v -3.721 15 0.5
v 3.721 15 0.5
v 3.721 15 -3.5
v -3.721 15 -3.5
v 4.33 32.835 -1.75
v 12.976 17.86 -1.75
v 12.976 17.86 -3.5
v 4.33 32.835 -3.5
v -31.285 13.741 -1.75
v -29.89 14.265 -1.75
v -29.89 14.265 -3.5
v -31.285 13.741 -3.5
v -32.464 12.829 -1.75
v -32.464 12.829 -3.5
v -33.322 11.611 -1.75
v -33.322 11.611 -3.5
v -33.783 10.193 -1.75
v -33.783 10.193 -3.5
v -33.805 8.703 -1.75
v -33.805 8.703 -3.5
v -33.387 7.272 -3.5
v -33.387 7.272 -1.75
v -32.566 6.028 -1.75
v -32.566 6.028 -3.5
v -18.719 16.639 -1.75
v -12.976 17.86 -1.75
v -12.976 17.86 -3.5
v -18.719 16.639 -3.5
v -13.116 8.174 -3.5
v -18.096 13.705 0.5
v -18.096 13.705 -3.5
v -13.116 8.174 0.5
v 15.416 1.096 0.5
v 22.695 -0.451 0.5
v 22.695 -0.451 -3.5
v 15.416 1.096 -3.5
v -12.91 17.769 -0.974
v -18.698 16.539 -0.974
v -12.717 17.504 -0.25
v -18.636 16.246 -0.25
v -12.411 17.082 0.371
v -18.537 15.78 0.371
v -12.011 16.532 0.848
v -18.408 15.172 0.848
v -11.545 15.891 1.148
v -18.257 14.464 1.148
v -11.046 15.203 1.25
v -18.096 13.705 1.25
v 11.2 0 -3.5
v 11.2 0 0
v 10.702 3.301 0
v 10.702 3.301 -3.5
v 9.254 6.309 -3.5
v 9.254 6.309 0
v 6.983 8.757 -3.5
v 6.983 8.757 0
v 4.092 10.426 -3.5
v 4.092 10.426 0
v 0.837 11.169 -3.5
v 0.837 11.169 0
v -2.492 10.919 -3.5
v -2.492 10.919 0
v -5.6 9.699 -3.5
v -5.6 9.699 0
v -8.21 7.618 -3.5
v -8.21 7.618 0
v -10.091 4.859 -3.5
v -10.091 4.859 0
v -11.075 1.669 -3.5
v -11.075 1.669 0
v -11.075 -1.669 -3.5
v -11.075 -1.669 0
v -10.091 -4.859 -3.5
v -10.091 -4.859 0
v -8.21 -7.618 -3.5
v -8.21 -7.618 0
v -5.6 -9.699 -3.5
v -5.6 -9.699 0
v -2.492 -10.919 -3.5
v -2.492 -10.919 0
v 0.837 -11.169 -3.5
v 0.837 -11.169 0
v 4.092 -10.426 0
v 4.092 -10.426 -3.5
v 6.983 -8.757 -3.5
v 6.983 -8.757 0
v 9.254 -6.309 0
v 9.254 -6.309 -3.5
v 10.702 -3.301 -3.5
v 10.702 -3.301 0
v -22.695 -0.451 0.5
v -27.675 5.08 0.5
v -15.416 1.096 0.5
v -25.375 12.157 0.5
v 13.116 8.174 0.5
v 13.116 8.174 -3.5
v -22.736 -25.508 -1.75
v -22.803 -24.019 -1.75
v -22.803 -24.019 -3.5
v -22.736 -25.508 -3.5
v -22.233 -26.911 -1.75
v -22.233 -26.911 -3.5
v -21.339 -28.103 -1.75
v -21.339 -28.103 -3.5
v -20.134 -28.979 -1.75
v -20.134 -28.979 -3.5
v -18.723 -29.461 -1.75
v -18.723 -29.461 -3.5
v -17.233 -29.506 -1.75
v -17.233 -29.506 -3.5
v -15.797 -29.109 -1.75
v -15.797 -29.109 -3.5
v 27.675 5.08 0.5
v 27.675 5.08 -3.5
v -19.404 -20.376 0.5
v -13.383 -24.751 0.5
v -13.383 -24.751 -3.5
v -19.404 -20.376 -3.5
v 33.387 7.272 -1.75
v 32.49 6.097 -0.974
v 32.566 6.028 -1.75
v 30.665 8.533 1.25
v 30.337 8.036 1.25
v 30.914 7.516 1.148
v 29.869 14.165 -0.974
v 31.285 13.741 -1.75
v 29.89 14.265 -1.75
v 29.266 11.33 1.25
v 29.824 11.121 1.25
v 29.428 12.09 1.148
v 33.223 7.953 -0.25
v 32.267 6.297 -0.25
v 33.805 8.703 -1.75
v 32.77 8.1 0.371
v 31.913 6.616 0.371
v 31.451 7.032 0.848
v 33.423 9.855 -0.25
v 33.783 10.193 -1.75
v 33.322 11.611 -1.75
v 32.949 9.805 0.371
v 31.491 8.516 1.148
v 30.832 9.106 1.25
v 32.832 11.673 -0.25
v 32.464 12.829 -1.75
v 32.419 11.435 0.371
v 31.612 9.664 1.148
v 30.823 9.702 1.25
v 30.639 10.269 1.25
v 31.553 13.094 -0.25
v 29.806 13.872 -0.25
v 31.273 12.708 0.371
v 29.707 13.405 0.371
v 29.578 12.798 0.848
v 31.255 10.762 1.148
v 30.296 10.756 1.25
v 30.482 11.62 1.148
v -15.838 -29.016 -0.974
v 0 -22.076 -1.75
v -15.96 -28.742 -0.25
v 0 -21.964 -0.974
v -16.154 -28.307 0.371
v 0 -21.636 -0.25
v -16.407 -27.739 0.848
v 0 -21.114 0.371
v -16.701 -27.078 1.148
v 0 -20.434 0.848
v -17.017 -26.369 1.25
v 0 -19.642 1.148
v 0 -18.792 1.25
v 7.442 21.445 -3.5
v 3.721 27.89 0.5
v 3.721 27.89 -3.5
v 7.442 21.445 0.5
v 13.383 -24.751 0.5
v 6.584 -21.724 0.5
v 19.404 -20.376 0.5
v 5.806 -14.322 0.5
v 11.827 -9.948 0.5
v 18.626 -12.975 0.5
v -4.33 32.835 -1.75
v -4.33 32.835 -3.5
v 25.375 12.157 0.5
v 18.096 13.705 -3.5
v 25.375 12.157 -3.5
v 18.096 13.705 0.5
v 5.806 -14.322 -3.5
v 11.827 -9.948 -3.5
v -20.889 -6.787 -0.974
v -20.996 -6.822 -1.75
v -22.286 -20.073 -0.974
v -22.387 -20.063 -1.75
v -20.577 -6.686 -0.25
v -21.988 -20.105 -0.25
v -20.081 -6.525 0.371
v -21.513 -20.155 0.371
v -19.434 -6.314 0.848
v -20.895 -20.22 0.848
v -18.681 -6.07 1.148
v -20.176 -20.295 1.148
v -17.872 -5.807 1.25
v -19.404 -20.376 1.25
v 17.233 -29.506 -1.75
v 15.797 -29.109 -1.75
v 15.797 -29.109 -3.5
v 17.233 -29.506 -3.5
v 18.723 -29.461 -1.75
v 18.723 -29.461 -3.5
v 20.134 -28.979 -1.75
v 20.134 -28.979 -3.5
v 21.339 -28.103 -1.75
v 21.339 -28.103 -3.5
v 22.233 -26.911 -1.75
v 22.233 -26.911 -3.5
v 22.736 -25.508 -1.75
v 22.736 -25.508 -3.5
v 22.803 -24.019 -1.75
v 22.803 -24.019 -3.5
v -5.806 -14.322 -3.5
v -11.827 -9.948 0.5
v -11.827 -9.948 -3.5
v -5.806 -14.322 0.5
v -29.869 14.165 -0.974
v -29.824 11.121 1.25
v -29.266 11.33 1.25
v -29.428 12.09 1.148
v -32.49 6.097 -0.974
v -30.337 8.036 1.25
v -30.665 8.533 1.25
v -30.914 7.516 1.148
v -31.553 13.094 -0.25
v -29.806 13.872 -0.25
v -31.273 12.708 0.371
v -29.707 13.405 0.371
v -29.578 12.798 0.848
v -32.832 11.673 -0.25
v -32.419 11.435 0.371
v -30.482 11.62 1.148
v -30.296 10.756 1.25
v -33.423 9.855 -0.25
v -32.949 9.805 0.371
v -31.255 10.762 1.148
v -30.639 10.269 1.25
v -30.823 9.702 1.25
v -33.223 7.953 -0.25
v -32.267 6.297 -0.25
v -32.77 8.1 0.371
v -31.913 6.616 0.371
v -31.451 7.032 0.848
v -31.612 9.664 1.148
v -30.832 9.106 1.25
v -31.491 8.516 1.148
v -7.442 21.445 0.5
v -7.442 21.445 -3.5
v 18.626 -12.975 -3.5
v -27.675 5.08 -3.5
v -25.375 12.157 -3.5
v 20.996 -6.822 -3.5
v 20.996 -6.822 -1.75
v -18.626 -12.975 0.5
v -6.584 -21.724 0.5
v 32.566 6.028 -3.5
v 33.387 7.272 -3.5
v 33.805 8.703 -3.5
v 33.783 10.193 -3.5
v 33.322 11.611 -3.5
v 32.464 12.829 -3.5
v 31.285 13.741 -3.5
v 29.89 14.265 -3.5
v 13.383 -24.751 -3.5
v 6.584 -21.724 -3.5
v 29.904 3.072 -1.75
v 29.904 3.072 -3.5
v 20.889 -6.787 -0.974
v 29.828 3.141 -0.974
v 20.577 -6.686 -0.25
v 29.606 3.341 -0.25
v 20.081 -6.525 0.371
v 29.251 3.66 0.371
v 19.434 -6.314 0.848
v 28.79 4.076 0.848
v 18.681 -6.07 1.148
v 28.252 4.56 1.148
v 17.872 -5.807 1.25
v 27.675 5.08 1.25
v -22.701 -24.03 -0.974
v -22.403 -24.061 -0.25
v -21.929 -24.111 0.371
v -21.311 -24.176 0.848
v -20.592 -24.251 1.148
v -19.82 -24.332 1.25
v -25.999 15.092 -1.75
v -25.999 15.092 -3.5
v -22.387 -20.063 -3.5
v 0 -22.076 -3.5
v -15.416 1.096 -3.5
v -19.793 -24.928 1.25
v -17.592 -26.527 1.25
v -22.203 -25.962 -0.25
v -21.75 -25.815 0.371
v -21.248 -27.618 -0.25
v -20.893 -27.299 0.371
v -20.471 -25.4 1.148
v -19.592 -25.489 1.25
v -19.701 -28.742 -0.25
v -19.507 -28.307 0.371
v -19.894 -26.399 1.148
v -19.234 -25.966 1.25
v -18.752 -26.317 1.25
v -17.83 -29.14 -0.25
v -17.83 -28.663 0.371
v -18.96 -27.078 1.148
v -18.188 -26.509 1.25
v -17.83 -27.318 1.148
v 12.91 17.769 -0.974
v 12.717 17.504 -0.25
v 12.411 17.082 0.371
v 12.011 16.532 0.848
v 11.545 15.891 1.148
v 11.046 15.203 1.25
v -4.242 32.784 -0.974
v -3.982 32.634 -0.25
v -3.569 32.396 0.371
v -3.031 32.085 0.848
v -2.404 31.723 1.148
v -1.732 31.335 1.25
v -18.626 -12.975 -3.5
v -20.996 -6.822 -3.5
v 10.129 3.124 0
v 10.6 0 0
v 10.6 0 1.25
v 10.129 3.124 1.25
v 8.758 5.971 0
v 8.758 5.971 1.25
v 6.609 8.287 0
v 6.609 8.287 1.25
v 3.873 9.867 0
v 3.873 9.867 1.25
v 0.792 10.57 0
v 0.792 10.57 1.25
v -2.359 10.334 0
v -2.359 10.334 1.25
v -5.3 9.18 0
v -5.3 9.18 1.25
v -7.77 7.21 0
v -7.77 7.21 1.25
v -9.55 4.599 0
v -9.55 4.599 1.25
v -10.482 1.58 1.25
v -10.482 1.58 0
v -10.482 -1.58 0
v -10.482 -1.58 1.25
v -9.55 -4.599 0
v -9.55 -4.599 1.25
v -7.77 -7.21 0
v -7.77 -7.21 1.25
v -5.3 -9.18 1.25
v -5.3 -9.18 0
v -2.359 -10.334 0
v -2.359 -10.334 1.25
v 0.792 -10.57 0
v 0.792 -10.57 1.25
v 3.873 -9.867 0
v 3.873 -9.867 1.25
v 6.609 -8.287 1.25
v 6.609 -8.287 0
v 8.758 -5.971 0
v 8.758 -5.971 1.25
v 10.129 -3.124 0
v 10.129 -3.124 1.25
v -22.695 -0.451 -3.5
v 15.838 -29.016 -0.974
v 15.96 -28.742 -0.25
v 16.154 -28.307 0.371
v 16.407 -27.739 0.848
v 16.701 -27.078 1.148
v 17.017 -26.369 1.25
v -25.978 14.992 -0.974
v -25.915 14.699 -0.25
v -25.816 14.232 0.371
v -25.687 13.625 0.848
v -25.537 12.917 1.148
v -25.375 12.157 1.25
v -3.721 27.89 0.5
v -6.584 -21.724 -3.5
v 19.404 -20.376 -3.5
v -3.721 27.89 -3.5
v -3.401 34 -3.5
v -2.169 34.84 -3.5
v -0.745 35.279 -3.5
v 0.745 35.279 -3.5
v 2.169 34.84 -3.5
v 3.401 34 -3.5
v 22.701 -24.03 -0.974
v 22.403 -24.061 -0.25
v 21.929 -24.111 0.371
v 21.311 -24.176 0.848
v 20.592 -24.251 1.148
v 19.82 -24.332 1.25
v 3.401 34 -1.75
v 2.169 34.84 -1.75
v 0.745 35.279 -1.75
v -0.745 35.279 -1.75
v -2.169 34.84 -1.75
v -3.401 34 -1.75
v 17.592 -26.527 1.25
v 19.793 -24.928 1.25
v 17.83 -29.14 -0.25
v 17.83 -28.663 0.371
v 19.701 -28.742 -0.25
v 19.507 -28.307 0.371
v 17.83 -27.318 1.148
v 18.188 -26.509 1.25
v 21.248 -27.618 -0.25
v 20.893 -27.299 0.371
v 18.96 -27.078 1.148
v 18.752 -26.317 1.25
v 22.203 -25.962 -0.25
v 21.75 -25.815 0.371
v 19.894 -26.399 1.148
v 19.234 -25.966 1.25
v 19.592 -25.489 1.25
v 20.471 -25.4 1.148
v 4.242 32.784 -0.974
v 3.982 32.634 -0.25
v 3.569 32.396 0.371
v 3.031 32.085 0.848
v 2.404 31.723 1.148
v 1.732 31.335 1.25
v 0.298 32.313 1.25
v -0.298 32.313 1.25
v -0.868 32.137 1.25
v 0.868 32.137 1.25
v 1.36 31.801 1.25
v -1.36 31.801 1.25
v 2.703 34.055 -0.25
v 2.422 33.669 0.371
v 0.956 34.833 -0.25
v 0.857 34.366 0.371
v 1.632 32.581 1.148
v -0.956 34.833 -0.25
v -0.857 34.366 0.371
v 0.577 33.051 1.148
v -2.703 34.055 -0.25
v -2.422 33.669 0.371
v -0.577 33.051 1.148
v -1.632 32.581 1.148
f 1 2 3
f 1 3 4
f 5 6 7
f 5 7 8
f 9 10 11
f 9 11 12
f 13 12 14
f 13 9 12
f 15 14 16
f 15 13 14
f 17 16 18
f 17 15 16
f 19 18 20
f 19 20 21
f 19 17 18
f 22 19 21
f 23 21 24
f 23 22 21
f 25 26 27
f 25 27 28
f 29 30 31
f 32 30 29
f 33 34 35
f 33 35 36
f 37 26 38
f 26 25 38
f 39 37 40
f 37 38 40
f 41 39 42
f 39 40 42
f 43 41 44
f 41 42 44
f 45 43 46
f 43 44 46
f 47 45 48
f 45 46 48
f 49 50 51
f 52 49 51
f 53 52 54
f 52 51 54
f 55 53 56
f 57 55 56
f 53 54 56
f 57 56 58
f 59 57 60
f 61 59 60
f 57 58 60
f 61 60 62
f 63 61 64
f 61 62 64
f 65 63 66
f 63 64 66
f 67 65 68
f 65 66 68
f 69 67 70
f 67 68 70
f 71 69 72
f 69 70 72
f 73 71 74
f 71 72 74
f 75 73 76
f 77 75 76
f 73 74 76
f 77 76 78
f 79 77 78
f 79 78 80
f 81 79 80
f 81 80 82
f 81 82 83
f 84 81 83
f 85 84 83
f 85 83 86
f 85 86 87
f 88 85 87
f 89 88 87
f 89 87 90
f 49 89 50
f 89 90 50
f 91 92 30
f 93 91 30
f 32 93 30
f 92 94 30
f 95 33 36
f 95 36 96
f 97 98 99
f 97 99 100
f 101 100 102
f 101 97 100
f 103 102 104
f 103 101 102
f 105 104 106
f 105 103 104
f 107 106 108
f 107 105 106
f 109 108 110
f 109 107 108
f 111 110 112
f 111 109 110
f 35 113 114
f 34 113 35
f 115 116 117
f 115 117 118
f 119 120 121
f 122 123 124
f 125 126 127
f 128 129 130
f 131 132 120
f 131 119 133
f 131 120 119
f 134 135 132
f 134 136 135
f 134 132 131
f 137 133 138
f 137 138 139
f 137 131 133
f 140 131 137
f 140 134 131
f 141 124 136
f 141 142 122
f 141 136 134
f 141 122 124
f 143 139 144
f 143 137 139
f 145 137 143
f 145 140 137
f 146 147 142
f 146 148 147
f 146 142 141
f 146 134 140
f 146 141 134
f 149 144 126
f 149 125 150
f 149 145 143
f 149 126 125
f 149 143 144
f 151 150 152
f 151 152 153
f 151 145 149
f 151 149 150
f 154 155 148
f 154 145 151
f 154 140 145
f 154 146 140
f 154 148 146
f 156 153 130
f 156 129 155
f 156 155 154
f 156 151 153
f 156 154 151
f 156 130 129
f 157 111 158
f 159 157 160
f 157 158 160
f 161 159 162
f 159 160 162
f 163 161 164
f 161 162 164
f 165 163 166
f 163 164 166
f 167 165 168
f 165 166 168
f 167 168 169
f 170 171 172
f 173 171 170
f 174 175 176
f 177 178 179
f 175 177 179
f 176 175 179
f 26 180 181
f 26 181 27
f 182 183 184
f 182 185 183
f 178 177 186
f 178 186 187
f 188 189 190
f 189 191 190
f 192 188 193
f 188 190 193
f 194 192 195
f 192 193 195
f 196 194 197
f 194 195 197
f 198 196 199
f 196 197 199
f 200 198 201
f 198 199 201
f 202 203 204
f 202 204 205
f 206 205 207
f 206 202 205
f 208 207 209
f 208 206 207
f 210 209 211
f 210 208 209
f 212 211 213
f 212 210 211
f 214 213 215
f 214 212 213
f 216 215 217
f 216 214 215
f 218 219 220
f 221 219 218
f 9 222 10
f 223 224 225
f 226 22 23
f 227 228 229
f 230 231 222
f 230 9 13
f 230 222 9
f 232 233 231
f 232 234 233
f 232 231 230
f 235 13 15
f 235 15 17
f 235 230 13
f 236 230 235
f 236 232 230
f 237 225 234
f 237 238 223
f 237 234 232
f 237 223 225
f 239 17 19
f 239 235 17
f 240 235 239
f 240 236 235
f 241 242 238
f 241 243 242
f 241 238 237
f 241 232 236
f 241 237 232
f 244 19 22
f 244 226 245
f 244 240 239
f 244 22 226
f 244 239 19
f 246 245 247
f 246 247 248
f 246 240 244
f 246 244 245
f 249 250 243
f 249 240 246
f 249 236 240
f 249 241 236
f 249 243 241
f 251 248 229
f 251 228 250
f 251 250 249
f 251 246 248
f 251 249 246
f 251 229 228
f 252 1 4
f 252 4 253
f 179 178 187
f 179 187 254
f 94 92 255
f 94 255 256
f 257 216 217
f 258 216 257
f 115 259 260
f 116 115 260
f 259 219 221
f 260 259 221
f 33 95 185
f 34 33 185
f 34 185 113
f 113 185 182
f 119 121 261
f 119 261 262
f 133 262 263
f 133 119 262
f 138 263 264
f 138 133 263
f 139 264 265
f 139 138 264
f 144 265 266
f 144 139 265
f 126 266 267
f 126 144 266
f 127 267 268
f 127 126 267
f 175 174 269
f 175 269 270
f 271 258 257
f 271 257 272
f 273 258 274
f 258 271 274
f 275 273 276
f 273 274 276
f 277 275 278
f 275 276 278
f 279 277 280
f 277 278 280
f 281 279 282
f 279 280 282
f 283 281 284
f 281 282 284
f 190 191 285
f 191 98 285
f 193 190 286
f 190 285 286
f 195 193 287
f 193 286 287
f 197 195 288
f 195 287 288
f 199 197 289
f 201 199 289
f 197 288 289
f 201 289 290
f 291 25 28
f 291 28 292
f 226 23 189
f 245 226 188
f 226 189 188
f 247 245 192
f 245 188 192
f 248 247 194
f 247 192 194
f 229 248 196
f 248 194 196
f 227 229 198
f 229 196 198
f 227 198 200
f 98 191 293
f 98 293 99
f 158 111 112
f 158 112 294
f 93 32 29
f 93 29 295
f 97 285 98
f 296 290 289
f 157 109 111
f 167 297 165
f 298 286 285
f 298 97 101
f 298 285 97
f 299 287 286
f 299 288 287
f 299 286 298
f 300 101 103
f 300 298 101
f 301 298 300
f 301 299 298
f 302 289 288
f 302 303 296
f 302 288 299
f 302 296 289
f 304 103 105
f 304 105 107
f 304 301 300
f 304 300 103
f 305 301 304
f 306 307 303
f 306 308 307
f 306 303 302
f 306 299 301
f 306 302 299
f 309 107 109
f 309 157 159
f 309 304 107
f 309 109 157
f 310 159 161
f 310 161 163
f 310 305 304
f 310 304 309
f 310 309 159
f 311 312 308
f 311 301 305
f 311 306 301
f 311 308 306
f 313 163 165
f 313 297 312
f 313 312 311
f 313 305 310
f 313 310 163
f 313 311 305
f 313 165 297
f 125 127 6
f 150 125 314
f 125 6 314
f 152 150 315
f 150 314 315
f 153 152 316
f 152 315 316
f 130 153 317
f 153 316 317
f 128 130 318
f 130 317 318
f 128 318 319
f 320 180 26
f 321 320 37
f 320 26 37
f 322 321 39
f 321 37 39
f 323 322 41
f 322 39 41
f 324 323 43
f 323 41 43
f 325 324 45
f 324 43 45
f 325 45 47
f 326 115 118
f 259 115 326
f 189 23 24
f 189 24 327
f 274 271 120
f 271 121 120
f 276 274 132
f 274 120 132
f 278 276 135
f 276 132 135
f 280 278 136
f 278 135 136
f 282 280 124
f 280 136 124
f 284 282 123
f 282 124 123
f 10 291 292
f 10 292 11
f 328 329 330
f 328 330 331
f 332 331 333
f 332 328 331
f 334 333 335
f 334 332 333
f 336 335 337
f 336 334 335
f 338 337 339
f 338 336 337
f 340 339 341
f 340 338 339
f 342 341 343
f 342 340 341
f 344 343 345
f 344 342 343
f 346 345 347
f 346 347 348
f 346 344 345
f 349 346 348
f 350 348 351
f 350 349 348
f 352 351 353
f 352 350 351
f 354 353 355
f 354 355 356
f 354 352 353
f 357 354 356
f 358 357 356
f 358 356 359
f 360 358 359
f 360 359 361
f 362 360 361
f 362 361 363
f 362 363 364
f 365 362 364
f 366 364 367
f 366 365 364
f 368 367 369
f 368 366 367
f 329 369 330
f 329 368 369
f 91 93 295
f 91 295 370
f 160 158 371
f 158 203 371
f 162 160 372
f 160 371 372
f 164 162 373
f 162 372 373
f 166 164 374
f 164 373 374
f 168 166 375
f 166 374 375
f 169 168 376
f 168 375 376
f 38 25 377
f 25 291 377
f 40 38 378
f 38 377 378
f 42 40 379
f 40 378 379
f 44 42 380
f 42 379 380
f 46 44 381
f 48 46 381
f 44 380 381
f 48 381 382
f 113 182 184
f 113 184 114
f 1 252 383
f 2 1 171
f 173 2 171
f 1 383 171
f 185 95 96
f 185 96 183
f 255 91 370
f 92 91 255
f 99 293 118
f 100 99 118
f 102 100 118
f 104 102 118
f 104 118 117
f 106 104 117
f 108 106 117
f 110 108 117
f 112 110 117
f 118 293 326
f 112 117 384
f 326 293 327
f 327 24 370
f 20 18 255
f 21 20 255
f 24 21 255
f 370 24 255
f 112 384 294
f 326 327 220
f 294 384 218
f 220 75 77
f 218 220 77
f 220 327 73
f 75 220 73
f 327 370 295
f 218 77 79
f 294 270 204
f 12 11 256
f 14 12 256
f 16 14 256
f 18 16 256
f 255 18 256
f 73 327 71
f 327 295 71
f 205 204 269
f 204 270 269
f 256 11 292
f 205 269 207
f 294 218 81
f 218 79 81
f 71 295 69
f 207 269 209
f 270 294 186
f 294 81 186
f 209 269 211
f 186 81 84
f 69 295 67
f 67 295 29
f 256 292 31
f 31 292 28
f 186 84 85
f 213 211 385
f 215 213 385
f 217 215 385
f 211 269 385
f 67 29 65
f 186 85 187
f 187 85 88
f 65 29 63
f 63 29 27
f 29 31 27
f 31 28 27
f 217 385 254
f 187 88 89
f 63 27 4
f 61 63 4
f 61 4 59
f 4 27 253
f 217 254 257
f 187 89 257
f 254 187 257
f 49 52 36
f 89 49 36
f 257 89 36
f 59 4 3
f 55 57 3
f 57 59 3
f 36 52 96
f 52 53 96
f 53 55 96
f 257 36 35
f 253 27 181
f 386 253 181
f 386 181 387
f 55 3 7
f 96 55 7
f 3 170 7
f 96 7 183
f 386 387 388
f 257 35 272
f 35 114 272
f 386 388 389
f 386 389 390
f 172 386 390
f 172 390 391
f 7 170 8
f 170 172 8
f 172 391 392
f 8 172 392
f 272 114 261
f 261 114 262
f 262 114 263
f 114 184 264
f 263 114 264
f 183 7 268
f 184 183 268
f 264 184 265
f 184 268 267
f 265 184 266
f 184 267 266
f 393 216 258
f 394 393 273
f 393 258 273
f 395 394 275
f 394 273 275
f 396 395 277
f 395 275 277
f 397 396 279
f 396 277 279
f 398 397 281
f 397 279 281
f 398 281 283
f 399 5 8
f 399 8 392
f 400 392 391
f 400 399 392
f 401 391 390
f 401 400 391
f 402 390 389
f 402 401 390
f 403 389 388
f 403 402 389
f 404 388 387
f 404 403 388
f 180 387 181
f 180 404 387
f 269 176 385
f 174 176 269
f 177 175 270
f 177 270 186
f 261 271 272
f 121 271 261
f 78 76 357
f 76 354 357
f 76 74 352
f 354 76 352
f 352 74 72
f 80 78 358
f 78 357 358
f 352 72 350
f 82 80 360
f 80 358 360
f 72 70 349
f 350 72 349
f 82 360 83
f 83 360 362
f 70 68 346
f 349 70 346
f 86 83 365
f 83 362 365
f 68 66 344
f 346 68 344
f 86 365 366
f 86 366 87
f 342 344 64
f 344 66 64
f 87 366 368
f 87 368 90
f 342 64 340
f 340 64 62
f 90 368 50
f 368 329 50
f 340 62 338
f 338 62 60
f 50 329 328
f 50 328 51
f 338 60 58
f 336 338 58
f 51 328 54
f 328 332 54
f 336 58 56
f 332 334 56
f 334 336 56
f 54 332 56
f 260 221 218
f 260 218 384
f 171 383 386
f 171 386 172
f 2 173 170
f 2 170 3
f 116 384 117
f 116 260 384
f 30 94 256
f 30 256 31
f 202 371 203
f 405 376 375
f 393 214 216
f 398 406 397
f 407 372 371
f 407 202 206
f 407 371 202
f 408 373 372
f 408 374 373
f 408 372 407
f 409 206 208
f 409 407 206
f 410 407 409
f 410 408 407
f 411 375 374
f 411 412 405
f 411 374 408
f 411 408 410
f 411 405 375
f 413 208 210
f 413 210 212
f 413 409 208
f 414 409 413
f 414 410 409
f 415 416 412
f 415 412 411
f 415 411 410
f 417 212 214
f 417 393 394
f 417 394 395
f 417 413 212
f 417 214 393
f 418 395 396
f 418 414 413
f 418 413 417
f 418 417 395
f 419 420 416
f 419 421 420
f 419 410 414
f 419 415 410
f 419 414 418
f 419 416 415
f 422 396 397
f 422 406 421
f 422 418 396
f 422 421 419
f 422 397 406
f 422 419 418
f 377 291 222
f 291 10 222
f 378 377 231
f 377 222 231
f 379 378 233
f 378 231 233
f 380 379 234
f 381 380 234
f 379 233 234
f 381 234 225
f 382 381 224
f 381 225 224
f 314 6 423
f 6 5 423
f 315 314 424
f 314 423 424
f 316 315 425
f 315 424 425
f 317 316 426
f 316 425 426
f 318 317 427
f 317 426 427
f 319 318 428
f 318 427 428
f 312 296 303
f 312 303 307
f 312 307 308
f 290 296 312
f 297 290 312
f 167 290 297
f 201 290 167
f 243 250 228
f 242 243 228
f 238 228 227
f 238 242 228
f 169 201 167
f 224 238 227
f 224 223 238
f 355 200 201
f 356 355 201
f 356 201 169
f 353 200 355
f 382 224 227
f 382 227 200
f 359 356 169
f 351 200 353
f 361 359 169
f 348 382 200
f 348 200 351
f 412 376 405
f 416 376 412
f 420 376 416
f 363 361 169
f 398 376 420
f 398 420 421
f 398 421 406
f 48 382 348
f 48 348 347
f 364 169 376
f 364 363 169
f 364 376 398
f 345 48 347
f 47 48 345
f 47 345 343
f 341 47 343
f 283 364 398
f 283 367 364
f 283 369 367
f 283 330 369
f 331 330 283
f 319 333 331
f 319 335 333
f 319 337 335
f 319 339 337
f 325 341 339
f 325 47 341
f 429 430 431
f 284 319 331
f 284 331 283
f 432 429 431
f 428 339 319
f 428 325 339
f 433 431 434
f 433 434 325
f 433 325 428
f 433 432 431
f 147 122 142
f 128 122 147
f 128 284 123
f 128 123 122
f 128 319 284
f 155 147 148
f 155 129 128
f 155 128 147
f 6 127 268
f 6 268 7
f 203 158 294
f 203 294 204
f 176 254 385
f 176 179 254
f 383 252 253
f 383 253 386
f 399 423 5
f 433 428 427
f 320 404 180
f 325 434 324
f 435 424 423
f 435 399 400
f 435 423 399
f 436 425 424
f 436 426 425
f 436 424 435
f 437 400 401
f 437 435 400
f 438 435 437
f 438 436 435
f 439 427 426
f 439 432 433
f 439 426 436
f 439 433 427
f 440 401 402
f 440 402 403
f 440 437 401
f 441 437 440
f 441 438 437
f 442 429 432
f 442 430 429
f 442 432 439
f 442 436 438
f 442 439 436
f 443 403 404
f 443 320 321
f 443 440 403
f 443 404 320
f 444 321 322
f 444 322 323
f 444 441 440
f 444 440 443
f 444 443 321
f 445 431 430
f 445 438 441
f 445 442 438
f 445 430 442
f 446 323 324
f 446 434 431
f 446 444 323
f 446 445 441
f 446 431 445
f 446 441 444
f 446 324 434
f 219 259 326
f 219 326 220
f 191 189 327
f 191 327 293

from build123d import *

# Parameters (mm, degrees)
F0_R     = 11.2
F0_R_2   = 10.6
F1_DEPTH = 1.25
F2_DEPTH = 3.5
F3_R     = 3
F4_DEPTH = 0.5


with BuildPart() as f1:
    # F0 (on Top) → F1 (new body)
    with BuildSketch(Plane.XY):
        with BuildLine():
            ThreePointArc((32.5660235492, 6.0283774926), (33.6055820033, 10.9191154962), (29.8898578759, 14.264768528))
            Line((29.8898578759, 14.264768528), (12.9759925753, 17.8599215809))
            Line((12.9759925753, 17.8599215809), (4.3301270189, 32.835))
            ThreePointArc((4.3301270189, 32.835), (0, 35.335), (-4.3301270189, 32.835))
            Line((-4.3301270189, 32.835), (-12.9759925753, 17.8599215809))
            Line((-12.9759925753, 17.8599215809), (-18.7194236958, 16.6391176097))
            Line((-18.7194236958, 16.6391176097), (-25.9988421276, 15.0918294569))
            Line((-25.9988421276, 15.0918294569), (-29.8898578759, 14.264768528))
            ThreePointArc((-29.8898578759, 14.264768528), (-33.6055820033, 10.9191154962), (-32.5660235492, 6.0283774926))
            Line((-32.5660235492, 6.0283774926), (-20.9955970247, -6.8218830075))
            Line((-20.9955970247, -6.8218830075), (-22.3872667993, -20.0627364432))
            Line((-22.3872667993, -20.0627364432), (-22.8030751051, -24.018888208))
            ThreePointArc((-22.8030751051, -24.018888208), (-20.7693918898, -28.5866154962), (-15.7967824129, -29.1092578126))
            Line((-15.7967824129, -29.1092578126), (0, -22.0760771468))
            Line((0, -22.0760771468), (15.7967824129, -29.1092578126))
            ThreePointArc((15.7967824129, -29.1092578126), (20.7693918898, -28.5866154962), (22.8030751051, -24.018888208))
            Line((22.8030751051, -24.018888208), (20.9955970247, -6.8218830075))
            Line((20.9955970247, -6.8218830075), (29.9042599002, 3.0721894725))
            Line((29.9042599002, 3.0721894725), (32.5660235492, 6.0283774926))
        make_face()
        with BuildLine():
            Line((3.7210224849, 27.89), (7.4420449699, 21.445))
            Line((7.4420449699, 21.445), (10.6005307066, 15.9743422289))
            ThreePointArc((10.6005307066, 15.9743422289), (11.1570110096, 15.3563082401), (11.9167581326, 15.0180470274))
            Line((11.9167581326, 15.0180470274), (18.0956886234, 13.7046748075))
            Line((18.0956886234, 13.7046748075), (25.3751070552, 12.1573866547))
            Line((25.3751070552, 12.1573866547), (29.2661228034, 11.3303257258))
            ThreePointArc((29.2661228034, 11.3303257258), (30.7524124544, 9.9920645131), (30.3365890728, 8.0357693116))
            Line((30.3365890728, 8.0357693116), (27.6748254238, 5.0795812915))
            Line((27.6748254238, 5.0795812915), (22.6951253605, -0.4509359188))
            Line((22.6951253605, -0.4509359188), (18.4682464081, -5.145360582))
            ThreePointArc((18.4682464081, -5.145360582), (18.0524230264, -5.865587806), (17.9654922683, -6.6926787213))
            Line((17.9654922683, -6.6926787213), (18.6257955889, -12.9750451642))
            Line((18.6257955889, -12.9750451642), (19.4037011132, -20.376321833))
            Line((19.4037011132, -20.376321833), (19.819509419, -24.3324735978))
            ThreePointArc((19.819509419, -24.3324735978), (19.0060361329, -26.1595645131), (17.0169923421, -26.3686214396))
            Line((17.0169923421, -26.3686214396), (13.3829602597, -24.7506461132))
            Line((13.3829602597, -24.7506461132), (6.5843138819, -21.7236937245))
            Line((6.5843138819, -21.7236937245), (0.8134732862, -19.154349953))
            ThreePointArc((0.8134732862, -19.154349953), (0, -18.9814408683), (-0.8134732862, -19.154349953))
            Line((-0.8134732862, -19.154349953), (-6.5843138819, -21.7236937245))
            Line((-6.5843138819, -21.7236937245), (-13.3829602597, -24.7506461132))
            Line((-13.3829602597, -24.7506461132), (-17.0169923421, -26.3686214396))
            ThreePointArc((-17.0169923421, -26.3686214396), (-19.0060361329, -26.1595645131), (-19.819509419, -24.3324735978))
            Line((-19.819509419, -24.3324735978), (-19.4037011132, -20.376321833))
            Line((-19.4037011132, -20.376321833), (-18.6257955889, -12.9750451642))
            Line((-18.6257955889, -12.9750451642), (-17.9654922683, -6.6926787213))
            ThreePointArc((-17.9654922683, -6.6926787213), (-18.0524230264, -5.865587806), (-18.4682464081, -5.145360582))
            Line((-18.4682464081, -5.145360582), (-22.6951253605, -0.4509359188))
            Line((-22.6951253605, -0.4509359188), (-27.6748254238, 5.0795812915))
            Line((-27.6748254238, 5.0795812915), (-30.3365890728, 8.0357693116))
            ThreePointArc((-30.3365890728, 8.0357693116), (-30.7524124544, 9.9920645131), (-29.2661228034, 11.3303257258))
            Line((-29.2661228034, 11.3303257258), (-25.3751070552, 12.1573866547))
            Line((-25.3751070552, 12.1573866547), (-18.0956886234, 13.7046748075))
            Line((-18.0956886234, 13.7046748075), (-11.9167581326, 15.0180470274))
            ThreePointArc((-11.9167581326, 15.0180470274), (-11.1570110096, 15.3563082401), (-10.6005307066, 15.9743422289))
            Line((-10.6005307066, 15.9743422289), (-7.4420449699, 21.445))
            Line((-7.4420449699, 21.445), (-3.7210224849, 27.89))
            Line((-3.7210224849, 27.89), (-1.7320508076, 31.335))
            ThreePointArc((-1.7320508076, 31.335), (0, 32.335), (1.7320508076, 31.335))
            Line((1.7320508076, 31.335), (3.7210224849, 27.89))
        make_face(mode=Mode.SUBTRACT)
        with BuildLine():
            Line((7.4420449699, 21.445), (3.7210224849, 15))
            Line((3.7210224849, 15), (-3.7210224849, 15))
            Line((-3.7210224849, 15), (-7.4420449699, 21.445))
            Line((-7.4420449699, 21.445), (-10.6005307066, 15.9743422289))
            ThreePointArc((-10.6005307066, 15.9743422289), (-11.1570110096, 15.3563082401), (-11.9167581326, 15.0180470274))
            Line((-11.9167581326, 15.0180470274), (-18.0956886234, 13.7046748075))
            Line((-18.0956886234, 13.7046748075), (-13.1159885601, 8.1741575972))
            Line((-13.1159885601, 8.1741575972), (-15.4157069287, 1.0963522341))
            Line((-15.4157069287, 1.0963522341), (-22.6951253605, -0.4509359188))
            Line((-22.6951253605, -0.4509359188), (-18.4682464081, -5.145360582))
            ThreePointArc((-18.4682464081, -5.145360582), (-18.0524230264, -5.865587806), (-17.9654922683, -6.6926787213))
            Line((-17.9654922683, -6.6926787213), (-18.6257955889, -12.9750451642))
            Line((-18.6257955889, -12.9750451642), (-11.8271492111, -9.9480927755))
            Line((-11.8271492111, -9.9480927755), (-5.8064083576, -14.3224170557))
            Line((-5.8064083576, -14.3224170557), (-6.5843138819, -21.7236937245))
            Line((-6.5843138819, -21.7236937245), (-0.8134732862, -19.154349953))
            ThreePointArc((-0.8134732862, -19.154349953), (0, -18.9814408683), (0.8134732862, -19.154349953))
            Line((0.8134732862, -19.154349953), (6.5843138819, -21.7236937245))
            Line((6.5843138819, -21.7236937245), (5.8064083576, -14.3224170557))
            Line((5.8064083576, -14.3224170557), (11.8271492111, -9.9480927755))
            Line((11.8271492111, -9.9480927755), (18.6257955889, -12.9750451642))
            Line((18.6257955889, -12.9750451642), (17.9654922683, -6.6926787213))
            ThreePointArc((17.9654922683, -6.6926787213), (18.0524230264, -5.865587806), (18.4682464081, -5.145360582))
            Line((18.4682464081, -5.145360582), (22.6951253605, -0.4509359188))
            Line((22.6951253605, -0.4509359188), (15.4157069287, 1.0963522341))
            Line((15.4157069287, 1.0963522341), (13.1159885601, 8.1741575972))
            Line((13.1159885601, 8.1741575972), (18.0956886234, 13.7046748075))
            Line((18.0956886234, 13.7046748075), (11.9167581326, 15.0180470274))
            ThreePointArc((11.9167581326, 15.0180470274), (11.1570110096, 15.3563082401), (10.6005307066, 15.9743422289))
            Line((10.6005307066, 15.9743422289), (7.4420449699, 21.445))
        make_face()
        Circle(F0_R, mode=Mode.SUBTRACT)
        Circle(F0_R)
        Circle(F0_R_2, mode=Mode.SUBTRACT)
        Polygon((-13.1159885601, 8.1741575972), (-18.0956886234, 13.7046748075), (-25.3751070552, 12.1573866547), (-27.6748254238, 5.0795812915), (-22.6951253605, -0.4509359188), (-15.4157069287, 1.0963522341), align=None)
        Polygon((-11.8271492111, -9.9480927755), (-18.6257955889, -12.9750451642), (-19.4037011132, -20.376321833), (-13.3829602597, -24.7506461132), (-6.5843138819, -21.7236937245), (-5.8064083576, -14.3224170557), align=None)
        Polygon((19.4037011132, -20.376321833), (18.6257955889, -12.9750451642), (11.8271492111, -9.9480927755), (5.8064083576, -14.3224170557), (6.5843138819, -21.7236937245), (13.3829602597, -24.7506461132), align=None)
        Polygon((25.3751070552, 12.1573866547), (18.0956886234, 13.7046748075), (13.1159885601, 8.1741575972), (15.4157069287, 1.0963522341), (22.6951253605, -0.4509359188), (27.6748254238, 5.0795812915), align=None)
        Polygon((-3.7210224849, 15), (3.7210224849, 15), (7.4420449699, 21.445), (3.7210224849, 27.89), (-3.7210224849, 27.89), (-7.4420449699, 21.445), align=None)
        with BuildLine():
            Line((-27.6748254238, 5.0795812915), (-25.3751070552, 12.1573866547))
            Line((-25.3751070552, 12.1573866547), (-29.2661228034, 11.3303257258))
            ThreePointArc((-29.2661228034, 11.3303257258), (-30.7524124544, 9.9920645131), (-30.3365890728, 8.0357693116))
            Line((-30.3365890728, 8.0357693116), (-27.6748254238, 5.0795812915))
        make_face()
        with BuildLine():
            Line((-13.3829602597, -24.7506461132), (-19.4037011132, -20.376321833))
            Line((-19.4037011132, -20.376321833), (-19.819509419, -24.3324735978))
            ThreePointArc((-19.819509419, -24.3324735978), (-19.0060361329, -26.1595645131), (-17.0169923421, -26.3686214396))
            Line((-17.0169923421, -26.3686214396), (-13.3829602597, -24.7506461132))
        make_face()
        with BuildLine():
            Line((19.819509419, -24.3324735978), (19.4037011132, -20.376321833))
            Line((19.4037011132, -20.376321833), (13.3829602597, -24.7506461132))
            Line((13.3829602597, -24.7506461132), (17.0169923421, -26.3686214396))
            ThreePointArc((17.0169923421, -26.3686214396), (19.0060361329, -26.1595645131), (19.819509419, -24.3324735978))
        make_face()
        with BuildLine():
            Line((29.2661228034, 11.3303257258), (25.3751070552, 12.1573866547))
            Line((25.3751070552, 12.1573866547), (27.6748254238, 5.0795812915))
            Line((27.6748254238, 5.0795812915), (30.3365890728, 8.0357693116))
            ThreePointArc((30.3365890728, 8.0357693116), (30.7524124544, 9.9920645131), (29.2661228034, 11.3303257258))
        make_face()
        with BuildLine():
            Line((-3.7210224849, 27.89), (3.7210224849, 27.89))
            Line((3.7210224849, 27.89), (1.7320508076, 31.335))
            ThreePointArc((1.7320508076, 31.335), (0, 32.335), (-1.7320508076, 31.335))
            Line((-1.7320508076, 31.335), (-3.7210224849, 27.89))
        make_face()
    extrude(amount=F1_DEPTH)

    # F0 (on Top) → F2 (join)
    with BuildSketch(Plane.XY):
        with BuildLine():
            ThreePointArc((32.5660235492, 6.0283774926), (33.6055820033, 10.9191154962), (29.8898578759, 14.264768528))
            Line((29.8898578759, 14.264768528), (12.9759925753, 17.8599215809))
            Line((12.9759925753, 17.8599215809), (4.3301270189, 32.835))
            ThreePointArc((4.3301270189, 32.835), (0, 35.335), (-4.3301270189, 32.835))
            Line((-4.3301270189, 32.835), (-12.9759925753, 17.8599215809))
            Line((-12.9759925753, 17.8599215809), (-18.7194236958, 16.6391176097))
            Line((-18.7194236958, 16.6391176097), (-25.9988421276, 15.0918294569))
            Line((-25.9988421276, 15.0918294569), (-29.8898578759, 14.264768528))
            ThreePointArc((-29.8898578759, 14.264768528), (-33.6055820033, 10.9191154962), (-32.5660235492, 6.0283774926))
            Line((-32.5660235492, 6.0283774926), (-20.9955970247, -6.8218830075))
            Line((-20.9955970247, -6.8218830075), (-22.3872667993, -20.0627364432))
            Line((-22.3872667993, -20.0627364432), (-22.8030751051, -24.018888208))
            ThreePointArc((-22.8030751051, -24.018888208), (-20.7693918898, -28.5866154962), (-15.7967824129, -29.1092578126))
            Line((-15.7967824129, -29.1092578126), (0, -22.0760771468))
            Line((0, -22.0760771468), (15.7967824129, -29.1092578126))
            ThreePointArc((15.7967824129, -29.1092578126), (20.7693918898, -28.5866154962), (22.8030751051, -24.018888208))
            Line((22.8030751051, -24.018888208), (20.9955970247, -6.8218830075))
            Line((20.9955970247, -6.8218830075), (29.9042599002, 3.0721894725))
            Line((29.9042599002, 3.0721894725), (32.5660235492, 6.0283774926))
        make_face()
        with BuildLine():
            Line((3.7210224849, 27.89), (7.4420449699, 21.445))
            Line((7.4420449699, 21.445), (10.6005307066, 15.9743422289))
            ThreePointArc((10.6005307066, 15.9743422289), (11.1570110096, 15.3563082401), (11.9167581326, 15.0180470274))
            Line((11.9167581326, 15.0180470274), (18.0956886234, 13.7046748075))
            Line((18.0956886234, 13.7046748075), (25.3751070552, 12.1573866547))
            Line((25.3751070552, 12.1573866547), (29.2661228034, 11.3303257258))
            ThreePointArc((29.2661228034, 11.3303257258), (30.7524124544, 9.9920645131), (30.3365890728, 8.0357693116))
            Line((30.3365890728, 8.0357693116), (27.6748254238, 5.0795812915))
            Line((27.6748254238, 5.0795812915), (22.6951253605, -0.4509359188))
            Line((22.6951253605, -0.4509359188), (18.4682464081, -5.145360582))
            ThreePointArc((18.4682464081, -5.145360582), (18.0524230264, -5.865587806), (17.9654922683, -6.6926787213))
            Line((17.9654922683, -6.6926787213), (18.6257955889, -12.9750451642))
            Line((18.6257955889, -12.9750451642), (19.4037011132, -20.376321833))
            Line((19.4037011132, -20.376321833), (19.819509419, -24.3324735978))
            ThreePointArc((19.819509419, -24.3324735978), (19.0060361329, -26.1595645131), (17.0169923421, -26.3686214396))
            Line((17.0169923421, -26.3686214396), (13.3829602597, -24.7506461132))
            Line((13.3829602597, -24.7506461132), (6.5843138819, -21.7236937245))
            Line((6.5843138819, -21.7236937245), (0.8134732862, -19.154349953))
            ThreePointArc((0.8134732862, -19.154349953), (0, -18.9814408683), (-0.8134732862, -19.154349953))
            Line((-0.8134732862, -19.154349953), (-6.5843138819, -21.7236937245))
            Line((-6.5843138819, -21.7236937245), (-13.3829602597, -24.7506461132))
            Line((-13.3829602597, -24.7506461132), (-17.0169923421, -26.3686214396))
            ThreePointArc((-17.0169923421, -26.3686214396), (-19.0060361329, -26.1595645131), (-19.819509419, -24.3324735978))
            Line((-19.819509419, -24.3324735978), (-19.4037011132, -20.376321833))
            Line((-19.4037011132, -20.376321833), (-18.6257955889, -12.9750451642))
            Line((-18.6257955889, -12.9750451642), (-17.9654922683, -6.6926787213))
            ThreePointArc((-17.9654922683, -6.6926787213), (-18.0524230264, -5.865587806), (-18.4682464081, -5.145360582))
            Line((-18.4682464081, -5.145360582), (-22.6951253605, -0.4509359188))
            Line((-22.6951253605, -0.4509359188), (-27.6748254238, 5.0795812915))
            Line((-27.6748254238, 5.0795812915), (-30.3365890728, 8.0357693116))
            ThreePointArc((-30.3365890728, 8.0357693116), (-30.7524124544, 9.9920645131), (-29.2661228034, 11.3303257258))
            Line((-29.2661228034, 11.3303257258), (-25.3751070552, 12.1573866547))
            Line((-25.3751070552, 12.1573866547), (-18.0956886234, 13.7046748075))
            Line((-18.0956886234, 13.7046748075), (-11.9167581326, 15.0180470274))
            ThreePointArc((-11.9167581326, 15.0180470274), (-11.1570110096, 15.3563082401), (-10.6005307066, 15.9743422289))
            Line((-10.6005307066, 15.9743422289), (-7.4420449699, 21.445))
            Line((-7.4420449699, 21.445), (-3.7210224849, 27.89))
            Line((-3.7210224849, 27.89), (-1.7320508076, 31.335))
            ThreePointArc((-1.7320508076, 31.335), (0, 32.335), (1.7320508076, 31.335))
            Line((1.7320508076, 31.335), (3.7210224849, 27.89))
        make_face(mode=Mode.SUBTRACT)
        with BuildLine():
            Line((29.2661228034, 11.3303257258), (25.3751070552, 12.1573866547))
            Line((25.3751070552, 12.1573866547), (27.6748254238, 5.0795812915))
            Line((27.6748254238, 5.0795812915), (30.3365890728, 8.0357693116))
            ThreePointArc((30.3365890728, 8.0357693116), (30.7524124544, 9.9920645131), (29.2661228034, 11.3303257258))
        make_face()
        with BuildLine():
            Line((7.4420449699, 21.445), (3.7210224849, 15))
            Line((3.7210224849, 15), (-3.7210224849, 15))
            Line((-3.7210224849, 15), (-7.4420449699, 21.445))
            Line((-7.4420449699, 21.445), (-10.6005307066, 15.9743422289))
            ThreePointArc((-10.6005307066, 15.9743422289), (-11.1570110096, 15.3563082401), (-11.9167581326, 15.0180470274))
            Line((-11.9167581326, 15.0180470274), (-18.0956886234, 13.7046748075))
            Line((-18.0956886234, 13.7046748075), (-13.1159885601, 8.1741575972))
            Line((-13.1159885601, 8.1741575972), (-15.4157069287, 1.0963522341))
            Line((-15.4157069287, 1.0963522341), (-22.6951253605, -0.4509359188))
            Line((-22.6951253605, -0.4509359188), (-18.4682464081, -5.145360582))
            ThreePointArc((-18.4682464081, -5.145360582), (-18.0524230264, -5.865587806), (-17.9654922683, -6.6926787213))
            Line((-17.9654922683, -6.6926787213), (-18.6257955889, -12.9750451642))
            Line((-18.6257955889, -12.9750451642), (-11.8271492111, -9.9480927755))
            Line((-11.8271492111, -9.9480927755), (-5.8064083576, -14.3224170557))
            Line((-5.8064083576, -14.3224170557), (-6.5843138819, -21.7236937245))
            Line((-6.5843138819, -21.7236937245), (-0.8134732862, -19.154349953))
            ThreePointArc((-0.8134732862, -19.154349953), (0, -18.9814408683), (0.8134732862, -19.154349953))
            Line((0.8134732862, -19.154349953), (6.5843138819, -21.7236937245))
            Line((6.5843138819, -21.7236937245), (5.8064083576, -14.3224170557))
            Line((5.8064083576, -14.3224170557), (11.8271492111, -9.9480927755))
            Line((11.8271492111, -9.9480927755), (18.6257955889, -12.9750451642))
            Line((18.6257955889, -12.9750451642), (17.9654922683, -6.6926787213))
            ThreePointArc((17.9654922683, -6.6926787213), (18.0524230264, -5.865587806), (18.4682464081, -5.145360582))
            Line((18.4682464081, -5.145360582), (22.6951253605, -0.4509359188))
            Line((22.6951253605, -0.4509359188), (15.4157069287, 1.0963522341))
            Line((15.4157069287, 1.0963522341), (13.1159885601, 8.1741575972))
            Line((13.1159885601, 8.1741575972), (18.0956886234, 13.7046748075))
            Line((18.0956886234, 13.7046748075), (11.9167581326, 15.0180470274))
            ThreePointArc((11.9167581326, 15.0180470274), (11.1570110096, 15.3563082401), (10.6005307066, 15.9743422289))
            Line((10.6005307066, 15.9743422289), (7.4420449699, 21.445))
        make_face()
        Circle(F0_R, mode=Mode.SUBTRACT)
        with BuildLine():
            Line((-3.7210224849, 27.89), (3.7210224849, 27.89))
            Line((3.7210224849, 27.89), (1.7320508076, 31.335))
            ThreePointArc((1.7320508076, 31.335), (0, 32.335), (-1.7320508076, 31.335))
            Line((-1.7320508076, 31.335), (-3.7210224849, 27.89))
        make_face()
        with BuildLine():
            Line((-27.6748254238, 5.0795812915), (-25.3751070552, 12.1573866547))
            Line((-25.3751070552, 12.1573866547), (-29.2661228034, 11.3303257258))
            ThreePointArc((-29.2661228034, 11.3303257258), (-30.7524124544, 9.9920645131), (-30.3365890728, 8.0357693116))
            Line((-30.3365890728, 8.0357693116), (-27.6748254238, 5.0795812915))
        make_face()
        with BuildLine():
            Line((-13.3829602597, -24.7506461132), (-19.4037011132, -20.376321833))
            Line((-19.4037011132, -20.376321833), (-19.819509419, -24.3324735978))
            ThreePointArc((-19.819509419, -24.3324735978), (-19.0060361329, -26.1595645131), (-17.0169923421, -26.3686214396))
            Line((-17.0169923421, -26.3686214396), (-13.3829602597, -24.7506461132))
        make_face()
        with BuildLine():
            Line((19.819509419, -24.3324735978), (19.4037011132, -20.376321833))
            Line((19.4037011132, -20.376321833), (13.3829602597, -24.7506461132))
            Line((13.3829602597, -24.7506461132), (17.0169923421, -26.3686214396))
            ThreePointArc((17.0169923421, -26.3686214396), (19.0060361329, -26.1595645131), (19.819509419, -24.3324735978))
        make_face()
    extrude(amount=-F2_DEPTH)

    # F3
    f3_edges = [f1.edges().sort_by_distance(p)[0] for p in [
        (-8.65306, 25.347461, 1.25),
        (-21.432925, 16.062345, 1.25),
        (-21.899336, -15.420386, 1.25),
        (7.898391, -25.592667, 1.25),
        (26.78081, -0.396753, 1.25),
    ]]
    fillet(f3_edges, radius=F3_R)

    # F4 (cut): faces of the model
    f4_faces = [f1.faces().sort_by_distance(p)[0] for p in [
        (20.3954069919, 6.6268694444, 0),
        (0, 21.445, 0),
        (-20.3954069919, 6.6268694444, 0),
        (-12.6050547354, -17.3493694444, 0),
        (12.6050547354, -17.3493694444, 0),
    ]]
    extrude(f4_faces, amount=-F4_DEPTH, mode=Mode.SUBTRACT)


solid = f1.part
